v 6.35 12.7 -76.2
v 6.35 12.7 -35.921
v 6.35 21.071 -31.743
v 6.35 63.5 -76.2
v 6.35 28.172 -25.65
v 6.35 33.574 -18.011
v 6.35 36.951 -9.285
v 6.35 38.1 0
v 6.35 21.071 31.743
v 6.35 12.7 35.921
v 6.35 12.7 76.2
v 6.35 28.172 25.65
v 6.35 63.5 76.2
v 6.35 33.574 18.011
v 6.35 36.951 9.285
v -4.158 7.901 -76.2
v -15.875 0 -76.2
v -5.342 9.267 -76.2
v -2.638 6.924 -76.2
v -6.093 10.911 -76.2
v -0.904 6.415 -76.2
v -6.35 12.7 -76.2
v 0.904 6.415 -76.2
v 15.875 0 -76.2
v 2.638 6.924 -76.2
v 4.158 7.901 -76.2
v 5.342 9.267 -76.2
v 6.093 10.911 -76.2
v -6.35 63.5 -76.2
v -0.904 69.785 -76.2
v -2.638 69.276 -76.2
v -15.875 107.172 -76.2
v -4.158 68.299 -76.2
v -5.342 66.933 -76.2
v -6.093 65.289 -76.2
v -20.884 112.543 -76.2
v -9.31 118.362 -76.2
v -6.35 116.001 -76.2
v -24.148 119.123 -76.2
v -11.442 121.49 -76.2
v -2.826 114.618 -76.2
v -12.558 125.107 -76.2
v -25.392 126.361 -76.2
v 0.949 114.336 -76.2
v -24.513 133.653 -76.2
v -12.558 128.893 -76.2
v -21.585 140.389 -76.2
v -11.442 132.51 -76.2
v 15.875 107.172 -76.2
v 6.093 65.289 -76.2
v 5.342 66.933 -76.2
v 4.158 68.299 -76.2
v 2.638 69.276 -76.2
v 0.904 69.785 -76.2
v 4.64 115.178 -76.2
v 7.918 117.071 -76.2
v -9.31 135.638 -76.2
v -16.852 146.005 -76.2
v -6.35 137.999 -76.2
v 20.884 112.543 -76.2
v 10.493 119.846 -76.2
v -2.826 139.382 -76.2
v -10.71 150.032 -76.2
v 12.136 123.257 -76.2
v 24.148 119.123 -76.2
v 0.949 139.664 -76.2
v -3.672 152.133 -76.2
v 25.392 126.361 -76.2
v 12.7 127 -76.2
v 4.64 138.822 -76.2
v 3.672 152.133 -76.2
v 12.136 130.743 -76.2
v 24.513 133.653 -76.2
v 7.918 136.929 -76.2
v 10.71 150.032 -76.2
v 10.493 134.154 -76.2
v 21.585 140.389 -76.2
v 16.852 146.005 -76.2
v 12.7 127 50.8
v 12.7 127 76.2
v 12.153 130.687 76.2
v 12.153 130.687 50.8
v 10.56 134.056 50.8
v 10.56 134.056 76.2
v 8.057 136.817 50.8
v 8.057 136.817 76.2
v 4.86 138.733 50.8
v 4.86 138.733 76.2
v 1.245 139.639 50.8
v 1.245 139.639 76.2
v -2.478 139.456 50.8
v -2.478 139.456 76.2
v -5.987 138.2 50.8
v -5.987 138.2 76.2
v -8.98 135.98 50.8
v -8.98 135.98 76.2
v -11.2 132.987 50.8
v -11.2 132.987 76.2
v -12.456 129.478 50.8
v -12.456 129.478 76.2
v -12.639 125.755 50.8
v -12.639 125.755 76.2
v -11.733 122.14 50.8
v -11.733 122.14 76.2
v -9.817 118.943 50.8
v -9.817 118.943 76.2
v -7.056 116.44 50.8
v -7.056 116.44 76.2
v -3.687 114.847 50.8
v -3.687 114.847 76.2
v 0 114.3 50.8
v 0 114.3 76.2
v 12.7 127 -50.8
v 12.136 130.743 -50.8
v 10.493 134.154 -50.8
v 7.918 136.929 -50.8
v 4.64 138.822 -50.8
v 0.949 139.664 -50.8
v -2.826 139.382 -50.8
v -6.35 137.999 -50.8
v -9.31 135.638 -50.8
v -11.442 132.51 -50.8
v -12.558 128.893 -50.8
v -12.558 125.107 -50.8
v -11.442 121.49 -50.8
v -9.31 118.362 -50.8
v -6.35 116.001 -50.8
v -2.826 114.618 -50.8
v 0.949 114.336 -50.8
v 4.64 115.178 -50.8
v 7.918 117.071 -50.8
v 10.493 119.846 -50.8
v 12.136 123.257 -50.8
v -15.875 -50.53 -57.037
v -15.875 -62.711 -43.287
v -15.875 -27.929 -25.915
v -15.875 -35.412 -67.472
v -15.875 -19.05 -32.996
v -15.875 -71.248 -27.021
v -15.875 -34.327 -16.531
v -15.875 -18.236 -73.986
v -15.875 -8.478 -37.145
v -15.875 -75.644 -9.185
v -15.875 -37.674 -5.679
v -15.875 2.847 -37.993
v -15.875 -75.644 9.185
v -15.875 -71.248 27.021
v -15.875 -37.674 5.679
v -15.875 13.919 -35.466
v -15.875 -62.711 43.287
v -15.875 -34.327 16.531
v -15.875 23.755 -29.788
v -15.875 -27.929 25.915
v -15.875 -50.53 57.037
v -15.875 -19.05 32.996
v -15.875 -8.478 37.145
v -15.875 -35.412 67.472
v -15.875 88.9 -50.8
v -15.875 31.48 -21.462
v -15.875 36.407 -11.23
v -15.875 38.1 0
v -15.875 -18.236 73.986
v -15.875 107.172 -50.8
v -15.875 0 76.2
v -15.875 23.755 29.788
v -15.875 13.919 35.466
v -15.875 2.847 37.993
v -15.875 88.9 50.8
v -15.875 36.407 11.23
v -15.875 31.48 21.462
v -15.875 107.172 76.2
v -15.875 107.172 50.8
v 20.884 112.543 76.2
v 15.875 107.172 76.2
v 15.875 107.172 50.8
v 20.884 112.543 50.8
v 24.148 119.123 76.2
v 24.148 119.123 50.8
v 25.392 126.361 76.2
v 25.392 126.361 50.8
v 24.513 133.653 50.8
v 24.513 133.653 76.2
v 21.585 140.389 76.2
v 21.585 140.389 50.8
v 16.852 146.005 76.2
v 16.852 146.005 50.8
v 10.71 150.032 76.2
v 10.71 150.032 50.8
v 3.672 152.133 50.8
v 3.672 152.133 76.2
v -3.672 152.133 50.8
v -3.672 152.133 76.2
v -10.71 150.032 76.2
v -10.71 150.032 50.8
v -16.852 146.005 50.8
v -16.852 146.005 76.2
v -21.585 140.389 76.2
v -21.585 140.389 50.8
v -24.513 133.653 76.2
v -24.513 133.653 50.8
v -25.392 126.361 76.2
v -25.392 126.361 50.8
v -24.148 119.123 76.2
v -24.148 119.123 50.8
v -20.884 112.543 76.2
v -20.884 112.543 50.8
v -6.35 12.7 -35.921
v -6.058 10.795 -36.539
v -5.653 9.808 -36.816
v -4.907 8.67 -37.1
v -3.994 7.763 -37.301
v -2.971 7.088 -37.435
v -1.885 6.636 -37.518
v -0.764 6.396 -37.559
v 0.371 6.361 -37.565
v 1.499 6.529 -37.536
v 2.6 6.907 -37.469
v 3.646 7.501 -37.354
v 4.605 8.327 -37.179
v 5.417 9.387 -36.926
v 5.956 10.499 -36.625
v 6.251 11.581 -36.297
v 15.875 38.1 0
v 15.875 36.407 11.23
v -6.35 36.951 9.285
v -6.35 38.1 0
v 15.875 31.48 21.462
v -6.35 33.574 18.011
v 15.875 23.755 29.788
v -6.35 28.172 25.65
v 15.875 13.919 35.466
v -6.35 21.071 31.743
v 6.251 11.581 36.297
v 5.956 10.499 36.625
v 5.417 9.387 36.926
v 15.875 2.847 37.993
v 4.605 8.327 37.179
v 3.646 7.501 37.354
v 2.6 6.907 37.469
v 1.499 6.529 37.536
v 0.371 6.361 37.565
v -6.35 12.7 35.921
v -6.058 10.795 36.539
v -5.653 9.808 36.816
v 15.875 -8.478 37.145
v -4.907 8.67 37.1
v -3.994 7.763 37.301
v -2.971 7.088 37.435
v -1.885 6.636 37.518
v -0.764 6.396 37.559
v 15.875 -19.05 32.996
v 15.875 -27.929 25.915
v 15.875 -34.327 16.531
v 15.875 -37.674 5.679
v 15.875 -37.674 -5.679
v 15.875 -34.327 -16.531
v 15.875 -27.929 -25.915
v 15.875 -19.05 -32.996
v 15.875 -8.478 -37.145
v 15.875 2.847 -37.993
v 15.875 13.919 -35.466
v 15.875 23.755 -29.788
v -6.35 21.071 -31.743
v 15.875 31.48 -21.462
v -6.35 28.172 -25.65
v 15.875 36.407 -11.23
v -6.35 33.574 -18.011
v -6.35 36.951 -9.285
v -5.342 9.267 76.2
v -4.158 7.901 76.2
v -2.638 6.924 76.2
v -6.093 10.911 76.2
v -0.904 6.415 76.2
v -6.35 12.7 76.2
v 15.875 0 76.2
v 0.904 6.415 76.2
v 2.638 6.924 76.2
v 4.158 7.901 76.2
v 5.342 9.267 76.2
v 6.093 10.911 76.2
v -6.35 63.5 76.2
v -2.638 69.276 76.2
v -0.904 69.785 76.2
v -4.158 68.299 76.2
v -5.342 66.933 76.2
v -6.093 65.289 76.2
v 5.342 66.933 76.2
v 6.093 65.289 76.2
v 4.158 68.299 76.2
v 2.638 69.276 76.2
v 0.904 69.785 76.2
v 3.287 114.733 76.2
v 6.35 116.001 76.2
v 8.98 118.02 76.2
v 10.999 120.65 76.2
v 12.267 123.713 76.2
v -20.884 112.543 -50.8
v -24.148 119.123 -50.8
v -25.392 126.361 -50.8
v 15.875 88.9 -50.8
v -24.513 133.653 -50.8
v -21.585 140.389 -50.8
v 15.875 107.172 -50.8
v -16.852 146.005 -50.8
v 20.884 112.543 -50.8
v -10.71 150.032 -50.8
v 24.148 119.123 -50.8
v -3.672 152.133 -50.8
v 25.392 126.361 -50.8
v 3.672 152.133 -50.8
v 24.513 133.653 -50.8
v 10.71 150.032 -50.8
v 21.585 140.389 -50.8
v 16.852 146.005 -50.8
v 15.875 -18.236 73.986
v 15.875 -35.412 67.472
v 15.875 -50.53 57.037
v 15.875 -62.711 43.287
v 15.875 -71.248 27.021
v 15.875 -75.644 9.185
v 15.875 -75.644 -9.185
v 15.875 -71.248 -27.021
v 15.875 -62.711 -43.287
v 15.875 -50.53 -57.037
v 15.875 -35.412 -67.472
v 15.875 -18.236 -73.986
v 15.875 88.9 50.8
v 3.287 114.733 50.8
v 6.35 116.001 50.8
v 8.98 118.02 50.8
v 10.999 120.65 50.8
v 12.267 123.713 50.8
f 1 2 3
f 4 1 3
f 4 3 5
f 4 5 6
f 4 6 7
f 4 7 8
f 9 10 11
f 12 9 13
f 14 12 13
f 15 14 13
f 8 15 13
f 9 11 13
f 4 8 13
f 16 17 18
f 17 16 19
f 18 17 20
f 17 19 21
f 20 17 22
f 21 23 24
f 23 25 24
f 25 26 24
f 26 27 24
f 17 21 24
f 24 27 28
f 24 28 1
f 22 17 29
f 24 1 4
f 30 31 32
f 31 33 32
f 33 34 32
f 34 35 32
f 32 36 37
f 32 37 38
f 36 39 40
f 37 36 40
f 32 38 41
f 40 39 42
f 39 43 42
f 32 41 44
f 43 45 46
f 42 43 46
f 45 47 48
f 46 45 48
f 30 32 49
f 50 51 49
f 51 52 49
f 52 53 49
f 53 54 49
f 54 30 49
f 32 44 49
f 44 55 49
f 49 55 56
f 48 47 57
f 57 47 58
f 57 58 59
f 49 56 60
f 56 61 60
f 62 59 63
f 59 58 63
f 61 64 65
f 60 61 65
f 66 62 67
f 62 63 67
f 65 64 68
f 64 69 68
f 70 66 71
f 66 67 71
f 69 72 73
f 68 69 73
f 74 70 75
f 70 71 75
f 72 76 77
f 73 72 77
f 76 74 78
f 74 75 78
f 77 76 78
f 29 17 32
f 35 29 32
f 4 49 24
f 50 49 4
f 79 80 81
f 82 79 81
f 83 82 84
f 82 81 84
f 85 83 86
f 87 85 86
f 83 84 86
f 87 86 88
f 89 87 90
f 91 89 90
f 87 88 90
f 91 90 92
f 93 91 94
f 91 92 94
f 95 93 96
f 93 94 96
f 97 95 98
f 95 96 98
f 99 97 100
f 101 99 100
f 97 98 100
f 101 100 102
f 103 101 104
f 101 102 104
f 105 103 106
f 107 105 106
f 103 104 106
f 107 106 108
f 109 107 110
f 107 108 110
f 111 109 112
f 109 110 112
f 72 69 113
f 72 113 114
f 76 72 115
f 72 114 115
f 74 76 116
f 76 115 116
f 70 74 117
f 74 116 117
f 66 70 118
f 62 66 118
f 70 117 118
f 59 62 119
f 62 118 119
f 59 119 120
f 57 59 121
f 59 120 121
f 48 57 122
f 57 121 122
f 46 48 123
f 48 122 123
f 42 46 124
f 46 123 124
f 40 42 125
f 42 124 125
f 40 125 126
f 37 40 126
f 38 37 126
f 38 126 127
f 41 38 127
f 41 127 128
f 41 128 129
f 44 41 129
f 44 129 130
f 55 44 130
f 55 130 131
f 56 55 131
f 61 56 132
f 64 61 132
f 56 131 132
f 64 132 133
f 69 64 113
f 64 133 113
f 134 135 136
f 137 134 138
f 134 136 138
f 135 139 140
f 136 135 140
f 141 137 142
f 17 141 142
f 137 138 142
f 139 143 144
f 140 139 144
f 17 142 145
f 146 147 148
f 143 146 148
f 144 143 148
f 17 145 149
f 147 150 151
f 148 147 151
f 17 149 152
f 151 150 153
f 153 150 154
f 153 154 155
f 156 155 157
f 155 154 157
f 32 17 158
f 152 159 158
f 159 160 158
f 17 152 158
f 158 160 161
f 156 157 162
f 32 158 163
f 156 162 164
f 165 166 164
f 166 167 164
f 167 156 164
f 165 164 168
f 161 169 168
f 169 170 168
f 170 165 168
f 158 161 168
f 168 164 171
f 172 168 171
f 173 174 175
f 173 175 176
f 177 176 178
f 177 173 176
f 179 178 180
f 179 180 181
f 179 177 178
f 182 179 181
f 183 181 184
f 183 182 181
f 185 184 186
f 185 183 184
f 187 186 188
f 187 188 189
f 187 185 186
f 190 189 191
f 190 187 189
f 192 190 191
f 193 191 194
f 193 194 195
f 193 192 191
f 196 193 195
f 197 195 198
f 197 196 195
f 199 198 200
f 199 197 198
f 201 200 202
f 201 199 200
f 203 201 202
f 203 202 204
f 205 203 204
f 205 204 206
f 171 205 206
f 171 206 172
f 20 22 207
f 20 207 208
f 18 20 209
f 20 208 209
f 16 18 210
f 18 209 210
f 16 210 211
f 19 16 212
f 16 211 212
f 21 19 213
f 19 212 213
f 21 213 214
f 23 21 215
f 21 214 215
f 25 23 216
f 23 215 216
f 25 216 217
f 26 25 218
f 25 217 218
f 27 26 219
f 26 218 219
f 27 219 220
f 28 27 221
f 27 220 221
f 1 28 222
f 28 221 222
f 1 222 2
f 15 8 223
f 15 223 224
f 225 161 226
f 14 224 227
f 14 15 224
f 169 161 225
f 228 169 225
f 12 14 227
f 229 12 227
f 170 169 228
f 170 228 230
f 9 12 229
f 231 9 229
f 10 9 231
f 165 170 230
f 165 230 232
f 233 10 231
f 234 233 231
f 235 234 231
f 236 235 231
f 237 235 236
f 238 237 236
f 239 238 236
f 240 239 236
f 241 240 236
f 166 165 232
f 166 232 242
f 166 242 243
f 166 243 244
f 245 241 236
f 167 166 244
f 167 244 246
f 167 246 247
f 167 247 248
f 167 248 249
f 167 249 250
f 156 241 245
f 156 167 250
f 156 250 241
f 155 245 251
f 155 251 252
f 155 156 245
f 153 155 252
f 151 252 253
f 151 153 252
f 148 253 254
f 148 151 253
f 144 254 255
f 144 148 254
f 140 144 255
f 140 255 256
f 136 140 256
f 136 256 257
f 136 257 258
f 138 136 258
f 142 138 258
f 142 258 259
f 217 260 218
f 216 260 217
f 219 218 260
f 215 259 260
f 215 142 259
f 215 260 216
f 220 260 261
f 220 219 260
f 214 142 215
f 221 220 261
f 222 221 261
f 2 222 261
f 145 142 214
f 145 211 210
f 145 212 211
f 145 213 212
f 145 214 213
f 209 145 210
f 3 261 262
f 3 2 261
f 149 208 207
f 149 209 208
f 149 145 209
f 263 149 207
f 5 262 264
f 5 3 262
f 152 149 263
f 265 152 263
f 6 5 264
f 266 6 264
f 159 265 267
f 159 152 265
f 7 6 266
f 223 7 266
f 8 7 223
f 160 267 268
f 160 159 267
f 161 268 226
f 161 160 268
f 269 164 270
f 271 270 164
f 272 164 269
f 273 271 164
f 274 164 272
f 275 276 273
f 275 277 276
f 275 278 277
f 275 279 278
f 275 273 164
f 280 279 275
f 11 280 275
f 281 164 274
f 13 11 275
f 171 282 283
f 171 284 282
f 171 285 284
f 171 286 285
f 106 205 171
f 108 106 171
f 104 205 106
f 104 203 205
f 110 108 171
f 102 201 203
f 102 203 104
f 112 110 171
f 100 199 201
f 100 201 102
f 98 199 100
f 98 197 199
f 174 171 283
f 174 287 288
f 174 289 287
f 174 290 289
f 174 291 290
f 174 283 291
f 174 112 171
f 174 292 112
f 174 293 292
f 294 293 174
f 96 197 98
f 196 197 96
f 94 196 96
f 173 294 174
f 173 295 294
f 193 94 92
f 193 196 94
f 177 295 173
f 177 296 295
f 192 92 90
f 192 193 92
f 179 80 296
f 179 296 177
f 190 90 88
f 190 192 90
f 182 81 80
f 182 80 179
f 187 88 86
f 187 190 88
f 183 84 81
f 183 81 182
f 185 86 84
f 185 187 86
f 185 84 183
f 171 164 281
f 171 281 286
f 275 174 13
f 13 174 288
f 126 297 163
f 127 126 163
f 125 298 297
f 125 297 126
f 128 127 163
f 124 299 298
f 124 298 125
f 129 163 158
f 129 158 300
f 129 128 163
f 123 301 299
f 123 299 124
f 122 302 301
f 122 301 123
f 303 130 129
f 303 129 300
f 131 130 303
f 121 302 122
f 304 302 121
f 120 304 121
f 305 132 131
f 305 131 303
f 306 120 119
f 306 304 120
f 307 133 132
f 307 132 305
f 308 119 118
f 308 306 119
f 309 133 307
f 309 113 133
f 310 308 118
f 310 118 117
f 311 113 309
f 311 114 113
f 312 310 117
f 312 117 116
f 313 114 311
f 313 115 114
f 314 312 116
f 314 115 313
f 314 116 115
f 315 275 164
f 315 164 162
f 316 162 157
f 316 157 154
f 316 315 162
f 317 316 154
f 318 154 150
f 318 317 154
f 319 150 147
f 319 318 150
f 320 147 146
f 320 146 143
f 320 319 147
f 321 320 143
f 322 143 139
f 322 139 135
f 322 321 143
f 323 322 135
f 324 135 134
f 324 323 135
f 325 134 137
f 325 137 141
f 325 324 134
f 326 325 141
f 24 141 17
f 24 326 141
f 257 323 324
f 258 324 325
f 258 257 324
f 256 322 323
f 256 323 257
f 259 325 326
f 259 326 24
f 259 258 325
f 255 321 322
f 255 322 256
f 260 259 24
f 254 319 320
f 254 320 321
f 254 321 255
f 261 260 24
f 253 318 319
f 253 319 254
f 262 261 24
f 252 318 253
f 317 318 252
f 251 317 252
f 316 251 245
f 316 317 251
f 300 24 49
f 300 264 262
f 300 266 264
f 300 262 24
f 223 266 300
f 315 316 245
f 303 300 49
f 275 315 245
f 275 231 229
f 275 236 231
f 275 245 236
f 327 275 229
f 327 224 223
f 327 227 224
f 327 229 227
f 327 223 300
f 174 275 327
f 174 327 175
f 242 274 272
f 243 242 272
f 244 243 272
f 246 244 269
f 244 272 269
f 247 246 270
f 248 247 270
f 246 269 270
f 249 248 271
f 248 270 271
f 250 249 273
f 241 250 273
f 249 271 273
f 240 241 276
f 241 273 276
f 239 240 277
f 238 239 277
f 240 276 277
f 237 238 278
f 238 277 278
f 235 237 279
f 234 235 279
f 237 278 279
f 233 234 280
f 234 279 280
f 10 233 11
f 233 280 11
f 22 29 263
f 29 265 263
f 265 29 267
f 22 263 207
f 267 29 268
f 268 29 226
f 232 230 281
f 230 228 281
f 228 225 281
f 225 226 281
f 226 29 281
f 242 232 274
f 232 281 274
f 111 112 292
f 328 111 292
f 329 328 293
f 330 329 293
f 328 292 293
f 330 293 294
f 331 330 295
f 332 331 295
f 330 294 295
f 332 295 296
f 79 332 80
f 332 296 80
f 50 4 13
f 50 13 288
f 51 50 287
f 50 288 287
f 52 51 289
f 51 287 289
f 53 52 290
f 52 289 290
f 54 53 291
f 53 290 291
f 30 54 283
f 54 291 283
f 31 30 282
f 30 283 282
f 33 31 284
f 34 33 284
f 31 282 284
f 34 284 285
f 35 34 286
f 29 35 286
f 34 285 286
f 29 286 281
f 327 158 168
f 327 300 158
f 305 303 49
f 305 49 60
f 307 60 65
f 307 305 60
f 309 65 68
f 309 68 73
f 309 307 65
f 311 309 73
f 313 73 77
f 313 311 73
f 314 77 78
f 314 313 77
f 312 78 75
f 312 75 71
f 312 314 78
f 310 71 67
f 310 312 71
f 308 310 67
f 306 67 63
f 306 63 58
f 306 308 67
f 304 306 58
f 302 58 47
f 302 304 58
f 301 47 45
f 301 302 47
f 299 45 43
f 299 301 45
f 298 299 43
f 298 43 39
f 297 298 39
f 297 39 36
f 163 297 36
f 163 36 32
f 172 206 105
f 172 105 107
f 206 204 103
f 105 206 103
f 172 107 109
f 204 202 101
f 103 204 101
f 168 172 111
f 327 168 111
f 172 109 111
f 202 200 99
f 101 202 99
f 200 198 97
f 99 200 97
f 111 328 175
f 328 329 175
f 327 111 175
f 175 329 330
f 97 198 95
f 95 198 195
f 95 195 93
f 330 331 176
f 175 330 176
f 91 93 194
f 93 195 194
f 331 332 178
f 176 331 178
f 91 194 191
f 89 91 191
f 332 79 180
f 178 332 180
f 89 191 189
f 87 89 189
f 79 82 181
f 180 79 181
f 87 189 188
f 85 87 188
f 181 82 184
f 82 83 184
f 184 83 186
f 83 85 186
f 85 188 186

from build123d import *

# Parameters (mm, degrees)
F0_R          = 38.1
F1_DEPTH      = 15.875
F1_DEPTH_BACK = 15.875
F3_DEPTH      = 25.4
F4_DEPTH      = 25.4
F6_DEPTH      = 25.4
F7_R          = 12.7
F8_DEPTH      = 25.4
F10_DEPTH     = 152.4


with BuildPart() as f1:
    # F0 (on Right) → F1 (new body, two sides)
    with BuildSketch(Plane.YZ) as f1_sk:
        with BuildLine():
            Line((114.3, 76.2), (0, 76.2))
            ThreePointArc((0, 76.2), (-76.2, 0), (0, -76.2))
            Line((0, -76.2), (114.3, -76.2))
            Line((114.3, -76.2), (114.3, -50.8))
            Line((114.3, -50.8), (88.9, -50.8))
            Line((88.9, -50.8), (88.9, 50.8))
            Line((88.9, 50.8), (114.3, 50.8))
            Line((114.3, 50.8), (114.3, 76.2))
        make_face()
        Circle(F0_R, mode=Mode.SUBTRACT)
    extrude(amount=F1_DEPTH)
    extrude(f1_sk.sketch, amount=-F1_DEPTH_BACK)

    # F2 (on face) → F3 (join, through all)
    with BuildSketch(Plane.XY.offset(76.2)):
        with BuildLine():
            Line((15.875, 114.3), (15.875, 107.172131))
            ThreePointArc((15.875, 107.172131), (0, 152.4), (-15.875, 107.172131))
            Line((-15.875, 107.172131), (-15.875, 114.3))
            Line((-15.875, 114.3), (0, 114.3))
            Line((0, 114.3), (15.875, 114.3))
        make_face()
        with BuildLine():
            ThreePointArc((12.7, 127), (8.980256, 118.019744), (0, 114.3))
            ThreePointArc((0, 114.3), (-8.980256, 135.980256), (12.7, 127))
        make_face(mode=Mode.SUBTRACT)
        with BuildLine():
            ThreePointArc((12.7, 127), (-8.980256, 135.980256), (0, 114.3))
            ThreePointArc((0, 114.3), (8.980256, 118.019744), (12.7, 127))
        make_face()
    extrude(amount=-F3_DEPTH)

    # F2 (on face) → F4 (cut, through all)
    with BuildSketch(Plane.XY.offset(76.2)):
        with BuildLine():
            ThreePointArc((12.7, 127), (-8.980256, 135.980256), (0, 114.3))
            ThreePointArc((0, 114.3), (8.980256, 118.019744), (12.7, 127))
        make_face()
    extrude(amount=-F4_DEPTH, mode=Mode.SUBTRACT)

    # F5 (on face) → F6 (join, through all)
    with BuildSketch(Plane.XY.offset(-50.8)):
        with BuildLine():
            Line((15.875, 114.3), (15.875, 107.172131))
            ThreePointArc((15.875, 107.172131), (0, 152.4), (-15.875, 107.172131))
            Line((-15.875, 107.172131), (-15.875, 114.3))
            Line((-15.875, 114.3), (15.875, 114.3))
        make_face()
    extrude(amount=-F6_DEPTH)

    # F7 (on face) → F8 (cut, through all)
    with BuildSketch(Plane.XY.offset(-50.8)):
        with Locations((0, 127)):
            Circle(F7_R)
    extrude(amount=-F8_DEPTH, mode=Mode.SUBTRACT)

    # F9 (on face) → F10 (cut, through all)
    with BuildSketch(Plane.XY.offset(76.2)):
        with BuildLine():
            Line((6.35, 12.7), (6.35, 63.5))
            ThreePointArc((6.35, 63.5), (0, 69.85), (-6.35, 63.5))
            Line((-6.35, 63.5), (-6.35, 12.7))
            ThreePointArc((-6.35, 12.7), (0, 6.35), (6.35, 12.7))
        make_face()
    extrude(amount=-F10_DEPTH, mode=Mode.SUBTRACT)


solid = f1.part
